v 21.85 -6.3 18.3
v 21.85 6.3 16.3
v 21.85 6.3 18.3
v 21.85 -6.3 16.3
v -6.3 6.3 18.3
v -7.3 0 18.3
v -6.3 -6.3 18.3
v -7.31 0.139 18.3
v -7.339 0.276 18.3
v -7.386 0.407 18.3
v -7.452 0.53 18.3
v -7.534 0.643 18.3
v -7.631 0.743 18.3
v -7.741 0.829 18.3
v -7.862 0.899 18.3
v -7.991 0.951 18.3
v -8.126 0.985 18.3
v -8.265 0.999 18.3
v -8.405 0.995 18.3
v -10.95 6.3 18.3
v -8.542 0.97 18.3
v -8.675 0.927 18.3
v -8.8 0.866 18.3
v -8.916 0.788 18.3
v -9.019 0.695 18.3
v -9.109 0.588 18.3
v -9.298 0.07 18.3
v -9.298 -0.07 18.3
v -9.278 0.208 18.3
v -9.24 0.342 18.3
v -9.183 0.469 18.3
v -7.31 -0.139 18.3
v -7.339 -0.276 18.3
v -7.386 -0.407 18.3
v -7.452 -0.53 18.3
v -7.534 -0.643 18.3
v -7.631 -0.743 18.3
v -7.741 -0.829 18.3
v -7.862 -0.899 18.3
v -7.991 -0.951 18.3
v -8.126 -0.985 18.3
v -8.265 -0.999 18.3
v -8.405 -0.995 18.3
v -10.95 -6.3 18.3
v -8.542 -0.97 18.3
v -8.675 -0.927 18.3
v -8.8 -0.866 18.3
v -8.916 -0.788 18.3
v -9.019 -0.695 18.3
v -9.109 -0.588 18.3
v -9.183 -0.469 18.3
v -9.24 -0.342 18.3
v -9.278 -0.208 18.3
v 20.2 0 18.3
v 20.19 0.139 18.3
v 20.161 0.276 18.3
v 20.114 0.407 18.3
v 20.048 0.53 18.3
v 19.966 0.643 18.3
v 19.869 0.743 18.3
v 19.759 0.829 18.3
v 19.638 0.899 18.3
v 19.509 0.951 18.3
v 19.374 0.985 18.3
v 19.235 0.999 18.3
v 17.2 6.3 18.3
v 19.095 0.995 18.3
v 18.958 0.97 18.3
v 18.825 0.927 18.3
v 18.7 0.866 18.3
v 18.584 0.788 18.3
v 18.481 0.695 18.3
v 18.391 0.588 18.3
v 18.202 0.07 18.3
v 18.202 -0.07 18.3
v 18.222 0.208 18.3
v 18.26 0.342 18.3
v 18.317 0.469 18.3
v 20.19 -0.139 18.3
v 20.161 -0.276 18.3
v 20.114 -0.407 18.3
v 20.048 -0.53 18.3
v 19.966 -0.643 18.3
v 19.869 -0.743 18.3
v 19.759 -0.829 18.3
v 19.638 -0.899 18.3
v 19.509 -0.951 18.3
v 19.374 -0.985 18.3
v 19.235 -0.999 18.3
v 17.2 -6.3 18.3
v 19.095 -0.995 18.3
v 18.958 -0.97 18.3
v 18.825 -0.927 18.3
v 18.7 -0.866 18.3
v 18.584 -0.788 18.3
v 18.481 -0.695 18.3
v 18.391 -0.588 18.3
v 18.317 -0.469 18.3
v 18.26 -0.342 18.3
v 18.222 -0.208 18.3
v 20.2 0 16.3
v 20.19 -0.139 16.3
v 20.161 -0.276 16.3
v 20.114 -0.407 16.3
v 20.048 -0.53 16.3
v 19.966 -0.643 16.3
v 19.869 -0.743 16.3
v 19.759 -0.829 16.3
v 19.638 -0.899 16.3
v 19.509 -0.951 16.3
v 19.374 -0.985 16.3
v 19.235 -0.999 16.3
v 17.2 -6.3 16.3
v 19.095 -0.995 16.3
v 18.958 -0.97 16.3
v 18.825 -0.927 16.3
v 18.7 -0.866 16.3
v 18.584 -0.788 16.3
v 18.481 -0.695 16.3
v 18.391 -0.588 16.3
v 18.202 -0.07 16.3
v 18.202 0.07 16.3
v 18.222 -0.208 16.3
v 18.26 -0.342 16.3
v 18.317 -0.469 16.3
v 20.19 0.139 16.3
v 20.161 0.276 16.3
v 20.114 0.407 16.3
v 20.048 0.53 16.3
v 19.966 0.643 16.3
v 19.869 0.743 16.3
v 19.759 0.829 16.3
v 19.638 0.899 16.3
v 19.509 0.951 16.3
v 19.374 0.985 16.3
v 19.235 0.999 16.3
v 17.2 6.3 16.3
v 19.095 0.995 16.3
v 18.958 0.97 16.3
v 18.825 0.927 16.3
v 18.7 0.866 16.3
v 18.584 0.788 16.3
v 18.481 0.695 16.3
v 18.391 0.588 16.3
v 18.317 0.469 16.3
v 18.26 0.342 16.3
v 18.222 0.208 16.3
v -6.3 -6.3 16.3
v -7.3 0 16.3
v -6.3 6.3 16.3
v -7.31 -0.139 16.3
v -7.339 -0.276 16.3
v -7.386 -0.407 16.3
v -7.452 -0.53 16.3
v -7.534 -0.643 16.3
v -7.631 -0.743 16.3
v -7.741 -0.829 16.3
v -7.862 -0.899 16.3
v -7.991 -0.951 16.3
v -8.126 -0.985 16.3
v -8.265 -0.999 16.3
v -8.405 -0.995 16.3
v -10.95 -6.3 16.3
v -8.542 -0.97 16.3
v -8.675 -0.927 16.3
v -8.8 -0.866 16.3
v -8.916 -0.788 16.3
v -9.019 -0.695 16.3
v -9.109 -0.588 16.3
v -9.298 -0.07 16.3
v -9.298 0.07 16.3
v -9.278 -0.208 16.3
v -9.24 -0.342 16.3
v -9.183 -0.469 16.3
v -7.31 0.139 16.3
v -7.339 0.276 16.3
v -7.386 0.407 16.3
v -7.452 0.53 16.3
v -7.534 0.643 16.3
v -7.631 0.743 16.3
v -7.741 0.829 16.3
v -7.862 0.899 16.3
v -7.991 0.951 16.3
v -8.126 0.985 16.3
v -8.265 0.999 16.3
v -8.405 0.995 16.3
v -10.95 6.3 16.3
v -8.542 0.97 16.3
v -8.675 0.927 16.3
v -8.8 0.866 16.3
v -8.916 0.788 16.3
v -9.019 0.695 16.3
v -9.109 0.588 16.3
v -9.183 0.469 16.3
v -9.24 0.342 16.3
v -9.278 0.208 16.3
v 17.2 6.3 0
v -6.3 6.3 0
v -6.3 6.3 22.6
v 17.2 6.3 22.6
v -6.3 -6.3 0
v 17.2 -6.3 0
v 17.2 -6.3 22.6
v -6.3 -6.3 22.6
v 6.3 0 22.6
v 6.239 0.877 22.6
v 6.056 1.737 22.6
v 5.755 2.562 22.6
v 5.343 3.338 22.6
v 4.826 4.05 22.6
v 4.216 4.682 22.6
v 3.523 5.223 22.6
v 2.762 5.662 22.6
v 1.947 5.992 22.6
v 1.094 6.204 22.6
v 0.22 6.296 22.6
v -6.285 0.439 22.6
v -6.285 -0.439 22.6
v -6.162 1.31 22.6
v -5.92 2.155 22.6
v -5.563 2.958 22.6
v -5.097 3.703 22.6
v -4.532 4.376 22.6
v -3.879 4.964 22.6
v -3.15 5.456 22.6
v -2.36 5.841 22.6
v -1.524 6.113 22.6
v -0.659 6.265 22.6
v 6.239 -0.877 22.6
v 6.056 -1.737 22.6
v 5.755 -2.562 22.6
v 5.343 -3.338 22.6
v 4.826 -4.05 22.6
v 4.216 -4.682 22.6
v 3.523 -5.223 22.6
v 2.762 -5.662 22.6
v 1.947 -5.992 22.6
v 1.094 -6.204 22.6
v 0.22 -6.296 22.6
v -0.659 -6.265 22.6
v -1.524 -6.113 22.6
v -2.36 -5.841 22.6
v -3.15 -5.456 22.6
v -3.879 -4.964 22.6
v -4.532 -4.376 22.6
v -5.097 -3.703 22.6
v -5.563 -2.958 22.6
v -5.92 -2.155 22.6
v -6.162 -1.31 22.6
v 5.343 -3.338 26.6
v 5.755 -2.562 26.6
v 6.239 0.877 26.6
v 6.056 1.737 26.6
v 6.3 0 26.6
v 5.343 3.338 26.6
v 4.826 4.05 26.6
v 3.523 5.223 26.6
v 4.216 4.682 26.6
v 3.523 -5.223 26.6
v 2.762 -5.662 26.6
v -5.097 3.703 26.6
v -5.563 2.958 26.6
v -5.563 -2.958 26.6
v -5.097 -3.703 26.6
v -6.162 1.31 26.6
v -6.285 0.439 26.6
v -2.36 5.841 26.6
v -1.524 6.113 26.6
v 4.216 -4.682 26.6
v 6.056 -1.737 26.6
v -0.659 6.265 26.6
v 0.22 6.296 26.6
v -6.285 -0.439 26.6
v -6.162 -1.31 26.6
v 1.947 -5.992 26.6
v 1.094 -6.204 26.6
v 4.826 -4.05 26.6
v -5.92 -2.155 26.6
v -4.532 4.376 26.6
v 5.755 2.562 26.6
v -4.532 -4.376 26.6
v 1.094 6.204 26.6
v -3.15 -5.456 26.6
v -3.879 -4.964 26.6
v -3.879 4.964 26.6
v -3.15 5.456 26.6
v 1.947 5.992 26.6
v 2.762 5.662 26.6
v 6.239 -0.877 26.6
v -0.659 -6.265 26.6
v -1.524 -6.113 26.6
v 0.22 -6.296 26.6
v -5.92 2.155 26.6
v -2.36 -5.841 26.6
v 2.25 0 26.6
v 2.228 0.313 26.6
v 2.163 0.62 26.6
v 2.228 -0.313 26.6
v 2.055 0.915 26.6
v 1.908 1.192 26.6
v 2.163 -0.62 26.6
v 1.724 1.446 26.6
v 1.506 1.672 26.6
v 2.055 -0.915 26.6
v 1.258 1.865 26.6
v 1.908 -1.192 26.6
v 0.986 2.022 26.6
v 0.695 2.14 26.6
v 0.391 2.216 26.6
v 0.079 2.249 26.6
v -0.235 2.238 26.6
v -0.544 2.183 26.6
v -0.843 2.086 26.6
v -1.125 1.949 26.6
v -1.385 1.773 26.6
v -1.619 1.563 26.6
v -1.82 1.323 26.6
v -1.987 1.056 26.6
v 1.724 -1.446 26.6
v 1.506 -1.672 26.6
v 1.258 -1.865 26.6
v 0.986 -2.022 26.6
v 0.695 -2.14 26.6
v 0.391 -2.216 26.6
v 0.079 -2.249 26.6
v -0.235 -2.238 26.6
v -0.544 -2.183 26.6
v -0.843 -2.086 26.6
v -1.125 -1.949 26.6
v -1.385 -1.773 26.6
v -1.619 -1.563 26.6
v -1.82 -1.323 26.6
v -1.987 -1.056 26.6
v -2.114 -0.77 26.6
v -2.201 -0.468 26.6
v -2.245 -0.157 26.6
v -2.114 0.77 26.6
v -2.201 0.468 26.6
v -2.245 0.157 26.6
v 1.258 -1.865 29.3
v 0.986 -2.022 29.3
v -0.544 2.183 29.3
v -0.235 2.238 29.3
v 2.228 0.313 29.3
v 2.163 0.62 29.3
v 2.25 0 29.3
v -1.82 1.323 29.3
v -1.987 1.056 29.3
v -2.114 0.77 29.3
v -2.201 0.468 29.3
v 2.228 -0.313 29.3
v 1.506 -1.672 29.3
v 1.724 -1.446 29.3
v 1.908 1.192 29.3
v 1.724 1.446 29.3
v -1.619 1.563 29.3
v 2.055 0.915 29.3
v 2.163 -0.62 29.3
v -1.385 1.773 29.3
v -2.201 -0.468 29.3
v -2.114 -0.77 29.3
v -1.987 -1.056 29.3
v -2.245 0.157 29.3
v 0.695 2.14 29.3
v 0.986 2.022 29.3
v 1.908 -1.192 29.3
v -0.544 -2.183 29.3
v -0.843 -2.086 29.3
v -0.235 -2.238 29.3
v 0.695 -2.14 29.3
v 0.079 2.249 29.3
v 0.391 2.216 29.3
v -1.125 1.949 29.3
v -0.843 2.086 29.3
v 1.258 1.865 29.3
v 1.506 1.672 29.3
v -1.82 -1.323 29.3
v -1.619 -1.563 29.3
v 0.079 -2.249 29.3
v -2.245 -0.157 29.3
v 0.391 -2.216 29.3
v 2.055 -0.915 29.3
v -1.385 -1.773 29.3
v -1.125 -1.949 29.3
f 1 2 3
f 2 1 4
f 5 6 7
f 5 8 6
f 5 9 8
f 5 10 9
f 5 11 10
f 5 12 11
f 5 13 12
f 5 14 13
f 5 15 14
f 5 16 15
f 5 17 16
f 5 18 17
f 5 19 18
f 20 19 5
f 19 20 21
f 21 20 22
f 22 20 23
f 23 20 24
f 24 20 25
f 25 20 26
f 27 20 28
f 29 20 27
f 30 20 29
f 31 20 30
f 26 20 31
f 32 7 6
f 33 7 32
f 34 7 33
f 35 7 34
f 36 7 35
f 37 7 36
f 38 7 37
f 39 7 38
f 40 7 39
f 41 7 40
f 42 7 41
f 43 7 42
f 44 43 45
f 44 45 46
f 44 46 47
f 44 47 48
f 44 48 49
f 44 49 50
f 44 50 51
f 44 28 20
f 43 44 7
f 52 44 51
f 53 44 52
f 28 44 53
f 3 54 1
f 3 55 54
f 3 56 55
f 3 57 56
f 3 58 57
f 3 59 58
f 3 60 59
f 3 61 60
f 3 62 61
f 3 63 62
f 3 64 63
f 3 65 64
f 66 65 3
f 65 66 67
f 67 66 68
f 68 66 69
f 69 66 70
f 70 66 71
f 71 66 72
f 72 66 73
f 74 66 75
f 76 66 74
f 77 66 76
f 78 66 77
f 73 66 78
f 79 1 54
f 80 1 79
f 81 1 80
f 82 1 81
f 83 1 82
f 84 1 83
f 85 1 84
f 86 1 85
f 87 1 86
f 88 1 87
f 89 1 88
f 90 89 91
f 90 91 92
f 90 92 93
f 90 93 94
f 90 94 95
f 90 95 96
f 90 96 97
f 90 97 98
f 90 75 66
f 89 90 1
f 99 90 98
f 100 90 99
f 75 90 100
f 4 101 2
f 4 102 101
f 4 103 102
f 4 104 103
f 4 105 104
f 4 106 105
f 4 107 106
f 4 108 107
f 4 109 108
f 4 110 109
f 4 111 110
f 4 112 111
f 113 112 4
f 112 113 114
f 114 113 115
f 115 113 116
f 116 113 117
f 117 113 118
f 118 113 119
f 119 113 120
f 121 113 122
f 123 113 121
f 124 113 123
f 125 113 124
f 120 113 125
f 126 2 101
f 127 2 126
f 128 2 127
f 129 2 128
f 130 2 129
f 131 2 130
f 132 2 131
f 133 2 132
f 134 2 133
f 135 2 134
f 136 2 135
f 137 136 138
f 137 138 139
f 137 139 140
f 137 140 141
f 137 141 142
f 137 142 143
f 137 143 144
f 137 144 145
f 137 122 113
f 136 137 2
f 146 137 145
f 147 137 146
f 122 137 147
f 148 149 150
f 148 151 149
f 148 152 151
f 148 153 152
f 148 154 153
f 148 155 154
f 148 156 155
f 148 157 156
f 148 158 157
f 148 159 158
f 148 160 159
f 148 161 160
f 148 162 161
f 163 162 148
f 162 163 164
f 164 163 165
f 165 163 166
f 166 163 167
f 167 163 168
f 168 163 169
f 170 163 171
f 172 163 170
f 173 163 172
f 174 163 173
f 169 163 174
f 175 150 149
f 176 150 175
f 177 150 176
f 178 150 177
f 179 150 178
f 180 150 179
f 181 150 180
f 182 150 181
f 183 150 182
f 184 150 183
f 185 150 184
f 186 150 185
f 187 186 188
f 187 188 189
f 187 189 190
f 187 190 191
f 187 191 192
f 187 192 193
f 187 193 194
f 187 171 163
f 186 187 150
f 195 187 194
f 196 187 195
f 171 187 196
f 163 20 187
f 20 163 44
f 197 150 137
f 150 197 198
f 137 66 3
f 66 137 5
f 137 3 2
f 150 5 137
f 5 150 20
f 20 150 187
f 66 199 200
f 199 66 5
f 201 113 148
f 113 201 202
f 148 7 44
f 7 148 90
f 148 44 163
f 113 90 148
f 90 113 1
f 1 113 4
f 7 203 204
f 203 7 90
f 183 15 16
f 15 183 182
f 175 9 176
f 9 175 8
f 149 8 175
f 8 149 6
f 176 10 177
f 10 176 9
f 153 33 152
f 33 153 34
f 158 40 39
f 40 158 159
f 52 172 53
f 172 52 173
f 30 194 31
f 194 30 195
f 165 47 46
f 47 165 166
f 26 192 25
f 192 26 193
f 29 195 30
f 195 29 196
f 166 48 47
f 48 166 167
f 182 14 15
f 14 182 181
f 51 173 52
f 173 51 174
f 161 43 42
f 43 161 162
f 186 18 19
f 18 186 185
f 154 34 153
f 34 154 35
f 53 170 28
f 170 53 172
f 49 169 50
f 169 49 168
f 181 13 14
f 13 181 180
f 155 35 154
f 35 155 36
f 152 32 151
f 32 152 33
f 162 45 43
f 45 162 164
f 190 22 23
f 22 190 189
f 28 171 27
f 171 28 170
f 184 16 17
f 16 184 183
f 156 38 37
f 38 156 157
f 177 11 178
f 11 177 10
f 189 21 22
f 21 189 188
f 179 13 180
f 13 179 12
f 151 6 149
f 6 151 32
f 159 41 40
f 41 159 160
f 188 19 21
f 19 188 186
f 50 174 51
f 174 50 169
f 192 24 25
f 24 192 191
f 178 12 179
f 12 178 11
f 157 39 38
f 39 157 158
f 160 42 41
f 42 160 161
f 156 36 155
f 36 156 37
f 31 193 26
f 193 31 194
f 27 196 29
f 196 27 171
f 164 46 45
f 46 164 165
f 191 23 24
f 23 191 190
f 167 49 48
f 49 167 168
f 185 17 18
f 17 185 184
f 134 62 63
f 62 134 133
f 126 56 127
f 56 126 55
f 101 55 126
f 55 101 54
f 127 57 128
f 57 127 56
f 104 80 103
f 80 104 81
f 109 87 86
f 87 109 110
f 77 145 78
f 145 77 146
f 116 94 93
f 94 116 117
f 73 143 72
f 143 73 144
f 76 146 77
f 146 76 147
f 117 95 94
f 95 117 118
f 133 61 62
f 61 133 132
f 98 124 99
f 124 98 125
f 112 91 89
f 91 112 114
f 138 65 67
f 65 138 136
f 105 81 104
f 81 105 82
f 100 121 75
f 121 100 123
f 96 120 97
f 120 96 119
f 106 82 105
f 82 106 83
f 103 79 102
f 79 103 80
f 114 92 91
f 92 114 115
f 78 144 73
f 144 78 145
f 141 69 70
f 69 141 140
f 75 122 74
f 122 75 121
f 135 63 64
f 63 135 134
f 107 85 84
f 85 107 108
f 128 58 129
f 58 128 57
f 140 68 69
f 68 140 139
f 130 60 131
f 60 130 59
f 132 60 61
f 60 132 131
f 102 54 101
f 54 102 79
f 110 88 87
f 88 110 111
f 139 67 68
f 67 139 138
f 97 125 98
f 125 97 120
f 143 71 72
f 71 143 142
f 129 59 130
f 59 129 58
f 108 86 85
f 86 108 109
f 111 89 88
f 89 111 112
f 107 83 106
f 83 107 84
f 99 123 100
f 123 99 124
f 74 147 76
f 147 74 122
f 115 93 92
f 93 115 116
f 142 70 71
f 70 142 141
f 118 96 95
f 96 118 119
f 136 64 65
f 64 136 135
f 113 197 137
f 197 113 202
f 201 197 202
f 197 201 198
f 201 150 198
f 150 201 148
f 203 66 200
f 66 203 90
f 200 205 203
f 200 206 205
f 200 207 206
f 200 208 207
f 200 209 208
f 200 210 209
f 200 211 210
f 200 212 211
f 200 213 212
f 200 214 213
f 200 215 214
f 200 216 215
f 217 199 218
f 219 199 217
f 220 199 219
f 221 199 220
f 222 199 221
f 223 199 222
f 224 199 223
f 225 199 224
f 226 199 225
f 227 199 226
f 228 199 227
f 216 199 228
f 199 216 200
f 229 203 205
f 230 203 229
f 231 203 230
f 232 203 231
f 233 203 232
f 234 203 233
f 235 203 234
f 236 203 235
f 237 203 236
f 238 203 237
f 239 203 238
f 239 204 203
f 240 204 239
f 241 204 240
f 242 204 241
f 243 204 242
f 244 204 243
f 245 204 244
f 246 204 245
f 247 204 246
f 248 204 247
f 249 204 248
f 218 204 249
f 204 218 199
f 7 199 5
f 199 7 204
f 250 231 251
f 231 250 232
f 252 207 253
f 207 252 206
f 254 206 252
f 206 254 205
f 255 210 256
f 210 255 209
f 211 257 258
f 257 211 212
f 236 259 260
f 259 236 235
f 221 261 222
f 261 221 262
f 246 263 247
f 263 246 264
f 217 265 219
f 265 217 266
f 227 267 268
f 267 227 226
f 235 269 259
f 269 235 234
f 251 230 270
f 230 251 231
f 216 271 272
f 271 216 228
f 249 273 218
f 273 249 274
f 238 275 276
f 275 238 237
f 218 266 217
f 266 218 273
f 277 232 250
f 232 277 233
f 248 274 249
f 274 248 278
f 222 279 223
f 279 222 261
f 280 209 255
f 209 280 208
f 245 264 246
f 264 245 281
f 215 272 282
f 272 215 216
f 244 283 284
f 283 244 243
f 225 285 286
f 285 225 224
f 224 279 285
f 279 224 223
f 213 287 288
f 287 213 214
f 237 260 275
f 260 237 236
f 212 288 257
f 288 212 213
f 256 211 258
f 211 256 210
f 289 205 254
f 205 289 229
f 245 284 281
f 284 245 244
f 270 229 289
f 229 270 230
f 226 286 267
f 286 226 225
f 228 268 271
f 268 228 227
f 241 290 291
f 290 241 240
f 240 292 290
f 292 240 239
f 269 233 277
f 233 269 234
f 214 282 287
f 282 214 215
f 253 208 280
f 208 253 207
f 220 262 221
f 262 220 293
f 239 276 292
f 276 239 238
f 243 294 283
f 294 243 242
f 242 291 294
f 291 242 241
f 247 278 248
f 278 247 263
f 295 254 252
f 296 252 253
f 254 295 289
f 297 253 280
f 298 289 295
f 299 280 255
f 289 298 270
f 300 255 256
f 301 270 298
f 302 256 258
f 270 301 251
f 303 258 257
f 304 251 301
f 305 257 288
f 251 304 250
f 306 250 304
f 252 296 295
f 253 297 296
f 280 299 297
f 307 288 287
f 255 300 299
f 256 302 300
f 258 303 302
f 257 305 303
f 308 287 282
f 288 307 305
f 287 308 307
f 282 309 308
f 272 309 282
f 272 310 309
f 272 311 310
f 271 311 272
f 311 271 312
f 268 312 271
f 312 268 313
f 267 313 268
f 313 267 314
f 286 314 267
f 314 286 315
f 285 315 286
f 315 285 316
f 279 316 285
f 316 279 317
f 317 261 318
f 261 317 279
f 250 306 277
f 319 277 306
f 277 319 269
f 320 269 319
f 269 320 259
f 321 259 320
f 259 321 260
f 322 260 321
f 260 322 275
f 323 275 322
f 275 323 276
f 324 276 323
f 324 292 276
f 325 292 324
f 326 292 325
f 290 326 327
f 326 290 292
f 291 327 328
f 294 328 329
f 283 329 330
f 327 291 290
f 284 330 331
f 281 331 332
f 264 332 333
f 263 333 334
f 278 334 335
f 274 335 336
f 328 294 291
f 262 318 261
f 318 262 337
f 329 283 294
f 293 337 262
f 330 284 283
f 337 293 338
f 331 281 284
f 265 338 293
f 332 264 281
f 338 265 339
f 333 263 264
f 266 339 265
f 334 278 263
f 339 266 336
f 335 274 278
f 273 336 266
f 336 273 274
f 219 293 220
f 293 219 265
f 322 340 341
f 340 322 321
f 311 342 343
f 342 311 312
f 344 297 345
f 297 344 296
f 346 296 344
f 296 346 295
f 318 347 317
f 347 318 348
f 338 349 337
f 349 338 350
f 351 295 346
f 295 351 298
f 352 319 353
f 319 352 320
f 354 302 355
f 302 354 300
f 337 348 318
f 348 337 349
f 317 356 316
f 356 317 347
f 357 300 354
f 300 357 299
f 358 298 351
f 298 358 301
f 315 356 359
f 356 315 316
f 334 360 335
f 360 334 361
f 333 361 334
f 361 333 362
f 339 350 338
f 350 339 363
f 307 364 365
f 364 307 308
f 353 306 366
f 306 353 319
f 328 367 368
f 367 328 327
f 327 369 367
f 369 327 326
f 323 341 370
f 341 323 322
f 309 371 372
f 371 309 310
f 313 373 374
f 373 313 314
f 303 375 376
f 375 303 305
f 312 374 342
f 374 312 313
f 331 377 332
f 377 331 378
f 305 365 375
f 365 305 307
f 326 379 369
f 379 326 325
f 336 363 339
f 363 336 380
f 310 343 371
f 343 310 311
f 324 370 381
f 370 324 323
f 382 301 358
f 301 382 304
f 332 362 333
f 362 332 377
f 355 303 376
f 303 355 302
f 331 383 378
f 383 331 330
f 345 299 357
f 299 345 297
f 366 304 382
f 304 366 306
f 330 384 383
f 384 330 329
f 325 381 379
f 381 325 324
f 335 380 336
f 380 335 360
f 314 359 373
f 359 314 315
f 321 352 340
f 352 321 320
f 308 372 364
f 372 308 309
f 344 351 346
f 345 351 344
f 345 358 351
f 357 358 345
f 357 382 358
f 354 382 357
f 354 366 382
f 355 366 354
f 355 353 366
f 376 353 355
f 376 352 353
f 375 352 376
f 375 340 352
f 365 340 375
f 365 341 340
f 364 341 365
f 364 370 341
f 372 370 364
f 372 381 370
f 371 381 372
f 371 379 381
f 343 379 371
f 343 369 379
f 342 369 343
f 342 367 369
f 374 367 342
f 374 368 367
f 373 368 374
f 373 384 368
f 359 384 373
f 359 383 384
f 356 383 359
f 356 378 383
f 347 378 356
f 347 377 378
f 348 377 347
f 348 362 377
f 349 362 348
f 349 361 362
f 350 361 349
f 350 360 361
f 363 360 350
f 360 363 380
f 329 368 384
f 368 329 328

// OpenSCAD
/*
 * Catbot scad file for cnc cutting
 */


use <MCAD/involute_gears.scad>

/*
 * Variables 
 */ 

// GLOBALS
matTh                   = 3;            // material thickness, int


brktW                   = 40;           // top bracket width, int 
brktH                   = 20;           // top bracket height

srvHldTW                = 50;           // servo holder top width, int 
srvHldTH                = 20;           // servo holder top width, int 

// servo spec
servoHoleDiam           = 1;            // servo mounting hole diameter
servoPlankTh            = 2.25;         // thickness of the servo mounting extruded part, int 

lzrHoleRadius           = 10.4;         // diameter of the laser, need tweaks, int 

// utils 
toothGap                = 0.1;          // reduced with of hole to be glue less assembled set to 0 to glue / solder , int 
circleFn                = 80;           // number of ark for a circle refine at will


/*
 * ELEMENTS 
 */

/*
 * CIRCULAR SERVO HORN MODULE  
 *
 * place circles in the corners, with the given radius, to have or not 
 * rounded corners and array is used for 0 no corner 1 for corners 
 * css style (top right, bottom right, bottom left, top left )
 *
 * PARAMS       :
 * diam         : outer gear Diameter 
 * innerRadius  : gear diameter (usually a bit smaller than the servo geared axis)
 */ 

module servoCircHorn(diam,innerRadius,gearHeight) {
    rotate([0,0,-4]) difference() {
        cylinder(h=matTh, r=diam, center=true, $fn=circleFn);
        translate([0,0,-1*matTh +1])
            servoConnectorGear(innerRadius,matTh);
    }
}


/*
 * BORDER  RADIUS BOX MODULE  
 *
 * place circles in the corners with the given radius at chosen corners  
 *
 * PARAMS  :
 * size    : module size [X,Y,Z],  array
 * radius  : the round corner radius, int
 * corners : 0 no corner 1 for corners (top right, bottom right, bottom left, top left ) , array
 * css style 
 *
 */ 

module borderRadiusbox(size, radius,corners)
{
    x = size[0];
    y = size[1];
    z = size[2];

    linear_extrude(height=z)
    hull(){
        
        // top left
        if(corners[3] == 1) {
            translate([(-x/2)+(radius/2), (y/2)-(radius/2), 0])
            circle(r=radius, $fn=circleFn);
        } else {
            translate([(-x/2), (y/2), 0])
            square(radius,true);
        }

        // top right
        if (corners[0] == 1 ){
            translate([(x/2)-(radius/2), (y/2)-(radius/2), 0])
            circle(r=radius, $fn=circleFn);   
        } else {
            translate([(x/2), (y/2), 0])
            square(radius,true);
        }
        

        // bottom right
        if(corners[1] == 1) {
            translate([(x/2)-(radius/2), (-y/2)+(radius/2), 0])
            circle(r=radius, $fn=circleFn);
        } else {
            translate([(x/2), (-y/2), 0])
            square(radius,true);
        }
        // bottom left 
        if(corners[2] == 1) {

            translate([(-x/2)+(radius/2), (-y/2)+(radius/2), 0])
            circle(r=radius, $fn=circleFn);
        } else {
            translate([(-x/2), (-y/2), 0])
            square(radius,true);
        }
    }
}

/*
 * SERVO CONNECTOR GEAR  
 *
 * extruded shaft to make the servo axis hole 
 *
 * PARAMS  :
 * innerRadius    : inherited, int
 *
 */ 

module servoConnectorGear(innerRadius,height) {
    
    innerteeth=12;
    innerpitch = innerRadius/innerteeth*360;
    gear (
            number_of_teeth=innerteeth,
            pressure_angle=45,
            circular_pitch=innerpitch,
            gear_thickness = height+1,
            rim_thickness = height+1,
            hub_thickness = height+1,
            bore_diameter = 0);
    
}

/*
 * CONNECTOR TOOTH 
 *
 * extruded bewelled cube to connect two parts layed in top view. 
 *
 * PARAMS :
 * size         : tooth size, array
 * bewelSize    : used if you cast it in mdf allow 2 part to be assembled glueless
 * orientation  : 0 N,1 E,2 S,3 W
 * 
 */ 

 module cToothMod(size,bewelSize,orientation) {

    /*translate([0,(matTh/2)]) */rotate (orientation* -90) linear_extrude(height = size[2]) polygon(points=[[0,0],[size[0],0],[(size[0]+bewelSize),size[1]],[(0-bewelSize),size[1]]], paths=[[0,1,2,3]]);
 }

// to see it in action :)

//cToothMod([matTh,matTh,matTh],0.1,1);
/*
 * PARTS 
 * constructed parts laid on top view
 */ 



module _topBracketUp(gearHole) {
    // left part (servo side)
    translate([0,0,-matTh/2])difference(){
        // main plate
        translate([5 ,0,0])
            borderRadiusbox([brktW,brktH,matTh], 5,[1,1,0,0]);    
            //translate([26,0,2]) cube(size=[matTh*2-0.1,matTh*-0.1,matTh+4], center=true);
        // hole for _servoCircHorn

        if(gearHole){
            translate([0,0,-matTh/2])
                servoConnectorGear(2.5);
        }
        // hole for _LazerHolder
        translate([27,0,0])cube(size=[matTh-0.1,(matTh*2)-0.1,10], center=true);
        
    }
}

// hold the laser, front panel 
module _topBracketMiddle(){
        difference(){
            cube(size=[brktW,brktH,matTh], center=false);
            translate([(brktW/2),brktW/4,0]) cylinder(h=50, r=10.5/2, center=true, $fn=circleFn);

        }
        translate([brktW,brktH/2+(matTh),0]){cToothMod([2*matTh,matTh,matTh],0.1,1);};
        translate([0,brktH/2-(matTh),0]){cToothMod([2*matTh,matTh,matTh],0.1,3);};
}


// circle to hold the laser in place need rework when the new laser arrives
module _laserHolderClip(innerDiam,circleDiam) {
    difference(){
        cylinder(h=matTh, r=innerDiam/2+circleDiam, center=false, $fn=circleFn);
        translate([0,0,-1]) cylinder(h=matTh+10, r=lzrHoleRadius/2, center=false, $fn=circleFn);
    }
}


// hold the Y axis servo
module _servoHolder(withServoCableHole){
    difference(){
        translate([-14.2,0,0]) cube([50,20,matTh], center=true);
        translate([-17.2,-6.3,-3]) cube([23.5,12.6,10.4]);
        translate ([-19.2,0,0])cylinder(h=100, r=servoHoleDiam, center=true, $fn=circleFn);
        if(withServoCableHole){
            translate ([6,0,0])cylinder(h=100, r=3, center=true, $fn=circleFn);
        } else {
            translate ([8.3,0,0])cylinder(h=100, r=servoHoleDiam, center=true, $fn=circleFn);
        }
        translate ([-30,11-matTh/2,0]) cube(size=[matTh,matTh+2,20], center=true);
        translate ([-30,-1*(11-matTh/2),0]) cube(size=[matTh,matTh+2,20], center=true);
        
    }

    translate([-39.2,(-matTh/2)+4,-(matTh/2)]){cToothMod([matTh,matTh,matTh],0.1,3);};     
    translate([-39.2,(-matTh/2)-4,-(matTh/2)]){cToothMod([matTh,matTh,matTh],0.1,3);};     
    
}

// clips the sevo holders
module _servoHolderClip() {
    fullw=servoPlankTh+matTh*4;
    fullh=9;
    gap=0.2;
    linear_extrude(height=matTh){

    polygon(points=[[0,0],[fullw,0],
                    [fullw,fullh],[fullw-matTh,fullh],
                    [fullw-matTh-gap,matTh],[fullw-matTh*2+gap,matTh],
                    [fullw-matTh*2,fullh],[fullw-matTh*2,fullh],
                    [fullw-matTh*2-servoPlankTh,fullh],[fullw-matTh*2-servoPlankTh,fullh],
                    [fullw-matTh*2-servoPlankTh-gap,matTh],[fullw-matTh*3-servoPlankTh+gap,matTh],
                    [fullw-matTh*3-servoPlankTh,fullw-matTh],[0,fullw-matTh]

                    ], paths=[[0,1,2,3,4,5,6,7,8,9,10,11,12,13]]);
    }
    
}


// x axis servo mount + Y axis holder
module _bottomBracketTop(withServo){
    holeDiam = matTh-0.1;
    difference(){
    cube(size=[50+2*matTh,19+2*matTh,matTh], center=true);
        translate([12.3,4,0]) cube(size=[holeDiam , holeDiam , 40], center=true);
        translate([12.3,-4,0]) cube(size=[holeDiam , holeDiam , 40], center=true);
        translate([12.3-matTh-servoPlankTh,4,0]) cube(size=[holeDiam , holeDiam , 40], center=true);
        translate([12.3-matTh-servoPlankTh,-4,0]) cube(size=[holeDiam , holeDiam , 40], center=true);

    }
        translate([-6.3,-6.3,-29]) rotate([0,0,0]) servo();
    if(withServo){
        translate([0,0,-matTh/2])
                servoConnectorGear(2.5);
    }

}

// servo dummys 
module servo() {
    color("LightBlue", 0.5) {
        cube([23.5,12.6,16.4]);
        translate([-4.65,0,16.3]) difference() {
            cube([32.8,12.6,2]);
            translate([2.65,6.3,-0.1]) cylinder(r=1,h=3,$fn=45);
            translate([32.8-2.65,6.3,-0.1]) cylinder(r=1,h=3,$fn=45);
        }
        translate([0,0,18.2]) cube([23.5,12.6,4.4]);
        translate([6.3,6.3,22.5]) cylinder(r=6.3,h=4.1,$fn=45);
        translate([6.3,6.3,26.5]) cylinder(r=2.25,h=2.8,$fn=45);
    }
}

// bottom servo holder
module _bottomServoHolder() {
    
}
translate([-6.3,-6.3,0]) rotate([0,0,0]) servo();
_bottomServoHolder();
/*
 * MODEL 
 * constructed parts placed to test the model
 */

/*
 * TOP BRACKET 
 */
module topBracket() {

    // top left 
    _topBracketUp(true); // left part with hole for the Y servo

    // top right
    translate([0,0,40+matTh]) _topBracketUp();

    // top middle
    translate ([31-6.5,-brktH/2,40+(matTh/2)]) rotate([0,90,0]) _topBracketMiddle();
}

/*
 * BOTTOM BRACKET 
 */
module bottomBracket(withServo) {
    // lower servo holder
    translate([0,0,9.2]) _servoHolder(true);

    // upper servo holder
    translate([0,0,9.2+servoPlankTh+matTh]) _servoHolder();

    // servo clips
    translate([-31.5,-10,19.2]) rotate([0,90,0]) _servoHolderClip();

    // bottomBracket
    if(withServo){   
        translate([-40,0,(brktW+matTh)/2]) rotate([0,90,0]) _bottomBracketTop();
    }else{
        translate([-40,0,(brktW+matTh)/2]) rotate([0,90,0]) _bottomBracketTop(true);
        
    }
}

// overview of the module for display and tests
module overview(withServo) {

    // offset and center the servo  dummy Y
    if(withServo){
        translate([6.3,-6.3,29]) rotate([0,180,0]) servo();
    }

    rotate([0,0,80])topBracket();
    if (withServo){
        bottomBracket(true);
    } else {
        bottomBracket();
    }
    
}

//rotate([0,-90]) overview(true);

/*
 * PROJECTIONS 
 * use them if you have time, the final render ... may kill your computer :(
 */ 
/*


projection(cut = true) _topBracketUp(false ,true);
projection(cut = true) translate([-46,0,0]) _topBracketUp();
projection(cut = true) translate ([-12.6,-2*brktH+6,0]) _topBracketMiddle();
projection(cut = true) translate ([-25.6,-2*brktH+16,0]) _laserHolderClip(lzrHoleRadius,2);  
projection(cut = true) translate ([-40.6,-2*brktH+16,0]) _laserHolderClip(lzrHoleRadius,2);
projection(cut = true) translate ([-12.6,-3*brktH+12,0]) _servoHolder(true);
projection(cut = true) translate ([-12.6,-4*brktH+10,0]) _servoHolder();
projection(cut = true) translate([-75.5,-2,0]) _servoHolderClip(true);
projection(cut = true) translate([-75.5,-15,0]) _servoHolderClip();
projection(cut = true) translate ([15.6,-4*brktH+12,0])  rotate(90) _bottomBracketTop();

*/

/*
 * Junk 
 * alway nice to have some junk part around 
 */


/*
// array of gears for testing
for ( i = [0 : 10] )
{
    translate([gearDist*i,0,0]){

        projection(cut = true) servoCircHorn(10,gearInitSize - 0.1*i);
    }
    

}
*/
